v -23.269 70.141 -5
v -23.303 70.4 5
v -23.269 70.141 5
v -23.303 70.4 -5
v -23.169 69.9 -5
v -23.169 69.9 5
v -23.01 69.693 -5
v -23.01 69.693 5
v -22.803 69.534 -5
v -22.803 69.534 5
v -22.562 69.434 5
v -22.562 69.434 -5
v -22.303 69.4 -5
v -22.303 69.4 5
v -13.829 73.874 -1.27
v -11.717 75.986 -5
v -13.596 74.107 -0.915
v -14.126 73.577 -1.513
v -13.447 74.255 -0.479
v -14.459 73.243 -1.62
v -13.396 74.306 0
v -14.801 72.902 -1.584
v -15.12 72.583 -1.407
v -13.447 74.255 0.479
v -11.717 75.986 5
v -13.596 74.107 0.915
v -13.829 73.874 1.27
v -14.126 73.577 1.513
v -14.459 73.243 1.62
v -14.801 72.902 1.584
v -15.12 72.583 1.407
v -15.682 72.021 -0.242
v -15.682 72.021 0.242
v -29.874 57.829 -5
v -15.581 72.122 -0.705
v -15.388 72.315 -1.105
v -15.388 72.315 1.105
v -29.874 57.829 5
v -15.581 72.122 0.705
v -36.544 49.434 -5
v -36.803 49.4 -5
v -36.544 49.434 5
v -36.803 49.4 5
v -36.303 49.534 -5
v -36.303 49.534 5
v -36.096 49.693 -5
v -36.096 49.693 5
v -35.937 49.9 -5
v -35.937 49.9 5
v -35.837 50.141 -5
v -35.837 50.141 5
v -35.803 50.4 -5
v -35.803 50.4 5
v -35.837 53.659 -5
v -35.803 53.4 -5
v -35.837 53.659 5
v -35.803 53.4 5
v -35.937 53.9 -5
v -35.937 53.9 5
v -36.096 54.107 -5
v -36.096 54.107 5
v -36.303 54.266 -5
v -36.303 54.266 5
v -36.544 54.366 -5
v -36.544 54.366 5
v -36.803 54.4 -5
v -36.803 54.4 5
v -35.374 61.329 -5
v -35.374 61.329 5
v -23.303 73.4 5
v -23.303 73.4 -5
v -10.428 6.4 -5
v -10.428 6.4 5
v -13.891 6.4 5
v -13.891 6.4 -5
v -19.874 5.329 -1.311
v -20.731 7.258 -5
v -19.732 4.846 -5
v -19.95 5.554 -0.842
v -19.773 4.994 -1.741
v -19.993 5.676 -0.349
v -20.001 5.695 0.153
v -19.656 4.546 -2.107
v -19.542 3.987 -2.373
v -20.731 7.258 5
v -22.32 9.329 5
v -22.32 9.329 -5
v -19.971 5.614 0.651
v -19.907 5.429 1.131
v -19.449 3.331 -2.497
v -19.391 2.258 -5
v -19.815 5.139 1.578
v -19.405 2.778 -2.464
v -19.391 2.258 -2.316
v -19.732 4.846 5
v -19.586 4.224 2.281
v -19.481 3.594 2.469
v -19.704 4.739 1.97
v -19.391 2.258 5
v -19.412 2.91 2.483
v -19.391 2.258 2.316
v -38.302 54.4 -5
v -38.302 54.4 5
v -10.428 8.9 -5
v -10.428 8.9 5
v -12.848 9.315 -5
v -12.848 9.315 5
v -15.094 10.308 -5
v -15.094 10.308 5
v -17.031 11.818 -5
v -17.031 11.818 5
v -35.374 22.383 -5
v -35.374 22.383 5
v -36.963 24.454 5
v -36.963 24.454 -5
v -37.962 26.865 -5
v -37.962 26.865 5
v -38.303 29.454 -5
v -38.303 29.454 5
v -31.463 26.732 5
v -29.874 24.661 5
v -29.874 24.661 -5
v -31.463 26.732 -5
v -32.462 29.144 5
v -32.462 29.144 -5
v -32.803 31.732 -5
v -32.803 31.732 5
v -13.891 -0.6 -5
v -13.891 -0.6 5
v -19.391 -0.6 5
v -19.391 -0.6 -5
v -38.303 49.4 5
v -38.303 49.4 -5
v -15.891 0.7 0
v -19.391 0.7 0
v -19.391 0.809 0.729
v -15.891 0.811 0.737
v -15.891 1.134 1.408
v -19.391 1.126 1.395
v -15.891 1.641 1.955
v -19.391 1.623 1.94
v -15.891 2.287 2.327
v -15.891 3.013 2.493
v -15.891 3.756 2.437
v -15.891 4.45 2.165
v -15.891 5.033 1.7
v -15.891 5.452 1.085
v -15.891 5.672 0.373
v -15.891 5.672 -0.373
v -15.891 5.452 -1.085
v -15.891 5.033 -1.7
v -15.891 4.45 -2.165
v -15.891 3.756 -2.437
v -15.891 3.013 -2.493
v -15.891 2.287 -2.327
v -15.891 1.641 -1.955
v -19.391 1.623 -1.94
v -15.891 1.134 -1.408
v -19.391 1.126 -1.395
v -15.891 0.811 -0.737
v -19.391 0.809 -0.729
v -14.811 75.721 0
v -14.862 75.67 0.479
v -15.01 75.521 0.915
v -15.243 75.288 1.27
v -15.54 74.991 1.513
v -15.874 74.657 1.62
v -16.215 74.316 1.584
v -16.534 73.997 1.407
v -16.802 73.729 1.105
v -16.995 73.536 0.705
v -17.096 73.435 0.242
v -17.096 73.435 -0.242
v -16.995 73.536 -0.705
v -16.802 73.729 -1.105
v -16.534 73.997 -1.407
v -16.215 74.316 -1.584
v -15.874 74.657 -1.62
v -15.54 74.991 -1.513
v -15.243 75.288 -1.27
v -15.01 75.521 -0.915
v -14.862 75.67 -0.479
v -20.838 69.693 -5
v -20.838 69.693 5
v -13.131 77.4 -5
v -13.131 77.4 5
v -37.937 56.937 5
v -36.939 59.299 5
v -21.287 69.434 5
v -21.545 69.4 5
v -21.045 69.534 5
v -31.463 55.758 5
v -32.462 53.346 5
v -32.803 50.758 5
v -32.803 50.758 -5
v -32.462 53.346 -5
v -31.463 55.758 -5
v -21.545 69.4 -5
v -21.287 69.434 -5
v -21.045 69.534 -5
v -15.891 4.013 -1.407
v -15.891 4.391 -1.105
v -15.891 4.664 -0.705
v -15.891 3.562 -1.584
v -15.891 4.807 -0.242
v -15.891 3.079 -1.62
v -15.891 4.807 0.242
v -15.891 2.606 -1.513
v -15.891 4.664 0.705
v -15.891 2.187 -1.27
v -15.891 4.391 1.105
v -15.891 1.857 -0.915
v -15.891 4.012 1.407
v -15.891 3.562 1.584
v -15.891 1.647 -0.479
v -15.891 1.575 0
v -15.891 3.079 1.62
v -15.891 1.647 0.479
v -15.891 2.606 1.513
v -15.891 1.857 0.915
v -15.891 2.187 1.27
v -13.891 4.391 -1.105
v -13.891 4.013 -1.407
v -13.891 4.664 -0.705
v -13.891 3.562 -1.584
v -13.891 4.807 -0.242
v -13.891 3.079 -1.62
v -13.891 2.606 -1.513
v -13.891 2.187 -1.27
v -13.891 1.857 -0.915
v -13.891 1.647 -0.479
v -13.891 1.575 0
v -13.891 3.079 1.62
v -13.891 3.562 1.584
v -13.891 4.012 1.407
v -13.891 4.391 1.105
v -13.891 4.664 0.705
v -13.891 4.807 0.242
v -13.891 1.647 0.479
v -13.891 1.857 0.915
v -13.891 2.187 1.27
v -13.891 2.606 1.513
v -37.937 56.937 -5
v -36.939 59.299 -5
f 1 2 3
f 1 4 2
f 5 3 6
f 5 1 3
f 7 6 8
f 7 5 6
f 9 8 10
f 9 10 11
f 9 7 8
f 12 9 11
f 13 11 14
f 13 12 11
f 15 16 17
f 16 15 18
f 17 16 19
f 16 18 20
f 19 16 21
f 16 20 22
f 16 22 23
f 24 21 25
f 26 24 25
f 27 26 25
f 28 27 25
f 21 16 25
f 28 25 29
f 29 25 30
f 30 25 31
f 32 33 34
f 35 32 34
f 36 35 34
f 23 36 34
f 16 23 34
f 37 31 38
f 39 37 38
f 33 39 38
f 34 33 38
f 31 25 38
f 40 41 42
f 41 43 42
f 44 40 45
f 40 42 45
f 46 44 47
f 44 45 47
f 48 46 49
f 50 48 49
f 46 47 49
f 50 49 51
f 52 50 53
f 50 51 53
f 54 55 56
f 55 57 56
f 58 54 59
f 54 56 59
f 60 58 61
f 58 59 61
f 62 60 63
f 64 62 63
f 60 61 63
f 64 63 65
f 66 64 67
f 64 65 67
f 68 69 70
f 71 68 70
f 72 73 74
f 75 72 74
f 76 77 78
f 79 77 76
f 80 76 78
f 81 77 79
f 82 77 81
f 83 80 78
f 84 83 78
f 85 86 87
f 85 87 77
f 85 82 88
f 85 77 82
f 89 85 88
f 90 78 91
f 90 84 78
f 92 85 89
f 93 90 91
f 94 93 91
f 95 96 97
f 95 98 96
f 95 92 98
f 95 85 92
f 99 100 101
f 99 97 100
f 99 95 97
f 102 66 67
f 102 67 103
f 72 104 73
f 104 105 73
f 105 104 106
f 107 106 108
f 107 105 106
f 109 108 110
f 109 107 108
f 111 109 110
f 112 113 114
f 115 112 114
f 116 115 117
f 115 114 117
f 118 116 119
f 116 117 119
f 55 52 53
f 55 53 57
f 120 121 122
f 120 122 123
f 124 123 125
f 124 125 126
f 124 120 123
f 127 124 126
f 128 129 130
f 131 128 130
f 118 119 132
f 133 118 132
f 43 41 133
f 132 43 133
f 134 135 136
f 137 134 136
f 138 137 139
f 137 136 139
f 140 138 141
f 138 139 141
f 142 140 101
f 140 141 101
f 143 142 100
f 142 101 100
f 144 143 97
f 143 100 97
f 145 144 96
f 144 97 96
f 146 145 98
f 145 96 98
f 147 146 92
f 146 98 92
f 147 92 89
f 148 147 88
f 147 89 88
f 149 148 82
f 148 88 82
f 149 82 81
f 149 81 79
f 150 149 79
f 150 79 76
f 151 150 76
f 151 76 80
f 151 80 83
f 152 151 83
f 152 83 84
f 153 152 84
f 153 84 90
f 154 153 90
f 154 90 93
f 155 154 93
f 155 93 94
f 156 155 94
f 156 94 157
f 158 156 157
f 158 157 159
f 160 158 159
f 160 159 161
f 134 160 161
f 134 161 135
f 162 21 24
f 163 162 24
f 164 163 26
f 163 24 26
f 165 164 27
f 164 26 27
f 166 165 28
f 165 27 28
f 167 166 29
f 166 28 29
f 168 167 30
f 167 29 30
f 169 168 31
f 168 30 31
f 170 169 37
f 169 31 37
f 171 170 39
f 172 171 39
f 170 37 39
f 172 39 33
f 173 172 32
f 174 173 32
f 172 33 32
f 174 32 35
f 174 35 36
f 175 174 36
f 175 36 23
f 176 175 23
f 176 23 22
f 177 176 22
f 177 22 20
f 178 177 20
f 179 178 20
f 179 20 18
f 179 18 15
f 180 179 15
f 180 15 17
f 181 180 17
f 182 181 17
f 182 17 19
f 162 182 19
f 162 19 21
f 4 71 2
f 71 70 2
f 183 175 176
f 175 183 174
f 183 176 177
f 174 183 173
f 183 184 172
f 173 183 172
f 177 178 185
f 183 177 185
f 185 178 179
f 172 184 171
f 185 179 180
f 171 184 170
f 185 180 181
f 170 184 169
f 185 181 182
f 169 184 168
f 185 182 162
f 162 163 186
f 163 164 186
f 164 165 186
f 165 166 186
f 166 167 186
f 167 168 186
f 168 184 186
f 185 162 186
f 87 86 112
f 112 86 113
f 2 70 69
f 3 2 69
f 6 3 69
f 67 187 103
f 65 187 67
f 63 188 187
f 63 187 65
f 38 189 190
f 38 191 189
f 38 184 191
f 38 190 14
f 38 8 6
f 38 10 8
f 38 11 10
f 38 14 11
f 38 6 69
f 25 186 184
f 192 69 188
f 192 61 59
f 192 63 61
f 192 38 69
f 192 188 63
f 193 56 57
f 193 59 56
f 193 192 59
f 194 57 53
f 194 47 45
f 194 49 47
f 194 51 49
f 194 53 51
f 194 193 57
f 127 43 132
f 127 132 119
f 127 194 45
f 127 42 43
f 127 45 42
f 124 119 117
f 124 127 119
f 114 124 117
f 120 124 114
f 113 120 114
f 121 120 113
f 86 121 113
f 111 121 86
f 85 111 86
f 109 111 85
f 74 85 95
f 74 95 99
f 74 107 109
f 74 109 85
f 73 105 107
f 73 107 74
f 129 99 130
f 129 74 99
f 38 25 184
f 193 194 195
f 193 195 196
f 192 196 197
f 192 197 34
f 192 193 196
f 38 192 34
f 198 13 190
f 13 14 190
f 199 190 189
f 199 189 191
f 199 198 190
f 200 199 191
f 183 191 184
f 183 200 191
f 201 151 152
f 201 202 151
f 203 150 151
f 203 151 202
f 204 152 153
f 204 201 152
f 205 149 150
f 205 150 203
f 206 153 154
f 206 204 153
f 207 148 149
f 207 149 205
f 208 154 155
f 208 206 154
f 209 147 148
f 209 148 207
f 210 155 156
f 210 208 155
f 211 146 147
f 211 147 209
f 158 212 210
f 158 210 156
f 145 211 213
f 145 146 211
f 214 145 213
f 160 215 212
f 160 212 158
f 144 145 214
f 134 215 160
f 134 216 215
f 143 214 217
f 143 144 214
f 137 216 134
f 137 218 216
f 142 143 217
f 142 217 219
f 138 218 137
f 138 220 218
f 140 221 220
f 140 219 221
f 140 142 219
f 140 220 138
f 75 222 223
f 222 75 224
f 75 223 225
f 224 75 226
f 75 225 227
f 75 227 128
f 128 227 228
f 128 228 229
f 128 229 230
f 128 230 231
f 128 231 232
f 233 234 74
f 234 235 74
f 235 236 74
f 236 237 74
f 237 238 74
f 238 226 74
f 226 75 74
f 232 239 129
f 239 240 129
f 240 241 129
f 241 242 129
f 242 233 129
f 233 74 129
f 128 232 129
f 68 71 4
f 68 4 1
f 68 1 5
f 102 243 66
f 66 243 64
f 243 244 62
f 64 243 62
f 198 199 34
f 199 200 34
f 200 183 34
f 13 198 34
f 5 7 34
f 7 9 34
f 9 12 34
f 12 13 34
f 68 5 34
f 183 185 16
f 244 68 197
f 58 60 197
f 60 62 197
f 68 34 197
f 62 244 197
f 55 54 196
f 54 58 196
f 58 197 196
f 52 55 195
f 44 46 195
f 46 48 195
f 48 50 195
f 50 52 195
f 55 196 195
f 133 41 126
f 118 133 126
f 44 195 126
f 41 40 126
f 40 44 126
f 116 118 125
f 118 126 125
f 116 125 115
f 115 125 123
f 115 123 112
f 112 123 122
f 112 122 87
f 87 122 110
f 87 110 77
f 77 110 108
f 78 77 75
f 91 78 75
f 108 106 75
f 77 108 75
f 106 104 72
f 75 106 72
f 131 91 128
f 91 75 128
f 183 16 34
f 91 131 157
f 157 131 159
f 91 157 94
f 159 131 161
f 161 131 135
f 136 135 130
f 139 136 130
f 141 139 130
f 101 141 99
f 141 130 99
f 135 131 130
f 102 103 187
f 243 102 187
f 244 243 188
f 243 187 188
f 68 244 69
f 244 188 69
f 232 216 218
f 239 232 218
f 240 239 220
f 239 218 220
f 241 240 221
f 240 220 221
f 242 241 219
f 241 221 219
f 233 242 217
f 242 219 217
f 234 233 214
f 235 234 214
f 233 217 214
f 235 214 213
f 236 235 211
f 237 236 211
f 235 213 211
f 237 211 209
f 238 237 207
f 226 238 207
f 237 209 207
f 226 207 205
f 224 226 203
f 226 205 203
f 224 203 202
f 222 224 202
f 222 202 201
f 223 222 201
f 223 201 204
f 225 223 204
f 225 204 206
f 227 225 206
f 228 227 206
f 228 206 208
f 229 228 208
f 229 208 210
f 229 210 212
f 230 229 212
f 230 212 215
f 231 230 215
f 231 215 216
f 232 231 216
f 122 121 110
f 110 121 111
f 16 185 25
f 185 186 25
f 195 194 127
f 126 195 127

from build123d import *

# Parameters (mm, degrees)
ESTRUSIONE_ESTRUSIONE1_DEPTH = 5
SCHIZZO2_R                   = 2.5
TAGLIO_ESTRUSIONE2_DEPTH     = 3.5
SCHIZZO3_R                   = 1.625
TAGLIO_ESTRUSIONE3_DEPTH     = 10
RACCORDO1_R                  = 10
SCHIZZO4_W                   = 2.5
SCHIZZO4_H                   = 5
TAGLIO_ESTRUSIONE4_DEPTH     = 10
RACCORDO2_R                  = 1
SCHIZZO5_R                   = 1.625
TAGLIO_ESTRUSIONE5_DEPTH     = 10


with BuildPart() as part:
    # Schizzo1 → Estrusione-Estrusione1 (new, symmetric)
    with BuildSketch(Plane.XY):
        Polygon((-13.891157033, -0.6), (-19.391157033, -0.6), (-19.391157033, 6.4), (-38.302699765, 25.311542732), (-38.302699765, 58.4), (-23.302699765, 73.4), (-23.302699765, 69.4), (-21.131126889, 69.4), (-13.131126889, 77.4), (-11.716913327, 75.985786438), (-32.802699765, 54.9), (-32.802699765, 27.589717325), (-14.11298244, 8.9), (-10.427699765, 8.9), (-10.427699765, 6.4), (-13.891157033, 6.4), align=None)
    extrude(amount=ESTRUSIONE_ESTRUSIONE1_DEPTH, both=True)

    # Schizzo2 → Taglio-Estrusione2 (cut)
    with BuildSketch(Plane.ZY.offset(19.391157033)):
        with Locations(Location((0, 3.2, 0), (0, 0, 270))):
            Circle(SCHIZZO2_R)
    extrude(amount=-TAGLIO_ESTRUSIONE2_DEPTH, mode=Mode.SUBTRACT)

    # Schizzo3 → Taglio-Estrusione3 (cut)
    with BuildSketch(Plane.ZY.offset(19.391157033)):
        with Locations(Location((0, 3.2, 0), (0, 0, 270))):
            Circle(SCHIZZO3_R)
    extrude(amount=-TAGLIO_ESTRUSIONE3_DEPTH, mode=Mode.SUBTRACT)

    # Raccordo1
    # the kernel refuses this fillet: 10 mm, written as the material it adds along each edge
    with BuildSketch(Plane(origin=(-19.391157033, 6.4, 5), x_dir=(0, -1, 0), z_dir=(0, 0, -1))) as raccordo1_piece_1_section:
        with BuildLine():
            CenterArc((RACCORDO1_R * 0.414213562373, RACCORDO1_R), RACCORDO1_R, 225, 45)
            Line((-RACCORDO1_R * 0.292893218813, RACCORDO1_R * 0.292893218813), (0, 0))
            Line((0, 0), (RACCORDO1_R * 0.414213562373, 0))
        make_face()
    raccordo1_piece_1 = extrude(amount=10, mode=Mode.PRIVATE)
    raccordo1_piece_1 = raccordo1_piece_1 - Plane(origin=(-19.391157033, 3.2, 0), x_dir=(0, -1, 0), z_dir=(-1, 0, 0)) * Cylinder(2.5, 37, mode=Mode.PRIVATE)
    add(raccordo1_piece_1)
    with BuildSketch(Plane(origin=(-14.11298244, 8.9, 5), x_dir=(-0.7071067811865495, 0.7071067811865456, 0), z_dir=(0, 0, -1))) as raccordo1_piece_2:
        with BuildLine():
            CenterArc((4.126652993, 10), RACCORDO1_R, 227.681279823, 42.318720177)
            Line((-2.60588837, 2.60588837), (0, 0))
            Line((0, 0), (4.126652993, 0))
        make_face()
    extrude(amount=10)
    with BuildSketch(Plane(origin=(-32.802699765, 27.589717325, 5), x_dir=(0, 1, 0), z_dir=(0, 0, -1)), Plane(origin=(-32.802699765, 54.9, 5), x_dir=(0.7071067811865458, 0.7071067811865492, 0), z_dir=(0, 0, -1))) as raccordo1_piece_3:
        with BuildLine():
            CenterArc((RACCORDO1_R * 0.414213562373, RACCORDO1_R), RACCORDO1_R, 225, 45)
            Line((-RACCORDO1_R * 0.292893218813, RACCORDO1_R * 0.292893218813), (0, 0))
            Line((0, 0), (RACCORDO1_R * 0.414213562373, 0))
        make_face()
    extrude(amount=10)
    # the kernel refuses this fillet: 10 mm, written as the material it takes off along each edge
    with BuildSketch(Plane(origin=(-38.302699765, 25.311542732, 15.355339059), x_dir=(0.7071067811865497, -0.7071067811865454, 0), z_dir=(0, 0, -1)), Plane(origin=(-38.302699765, 58.4, 15.355339059), x_dir=(0, -1, 0), z_dir=(0, 0, -1))) as raccordo1_2_piece_1:
        with BuildLine():
            CenterArc((RACCORDO1_R * 0.414213562373, -RACCORDO1_R), RACCORDO1_R, 90, 45)
            Line((-RACCORDO1_R * 0.292893218813, -RACCORDO1_R * 0.292893218813), (0, 0))
            Line((0, 0), (RACCORDO1_R * 0.414213562373, 0))
        make_face()
    extrude(amount=30.710678119, mode=Mode.SUBTRACT)

    # Schizzo4 → Taglio-Estrusione4 (cut)
    with BuildSketch(Plane(origin=(0, 0, -5), x_dir=(-1, 0, 0), z_dir=(0, 0, -1))):
        with Locations((37.052699765, 51.9)):
            Rectangle(SCHIZZO4_W, SCHIZZO4_H)
    extrude(amount=-TAGLIO_ESTRUSIONE4_DEPTH, mode=Mode.SUBTRACT)

    # Raccordo2
    raccordo2_edges = [part.edges().sort_by_distance(p)[0] for p in [
        (-35.802699765, 49.4, 0),
        (-35.802699765, 54.4, 0),
        (-23.302699765, 69.4, 0),
        (-21.131126889, 69.4, 0),
    ]]
    fillet(raccordo2_edges, radius=RACCORDO2_R)

    # Schizzo5 → Taglio-Estrusione5 (cut)
    with BuildSketch(Plane(origin=(-43.851349882, 43.851349882, 0), x_dir=(0, 0, -1), z_dir=(0.707106781186549, -0.707106781186546, 0))):
        with Locations(Location((0, 41.444955996, 0), (0, 0, 90))):
            Circle(SCHIZZO5_R)
    extrude(amount=-TAGLIO_ESTRUSIONE5_DEPTH, mode=Mode.SUBTRACT)


solid = part.part
